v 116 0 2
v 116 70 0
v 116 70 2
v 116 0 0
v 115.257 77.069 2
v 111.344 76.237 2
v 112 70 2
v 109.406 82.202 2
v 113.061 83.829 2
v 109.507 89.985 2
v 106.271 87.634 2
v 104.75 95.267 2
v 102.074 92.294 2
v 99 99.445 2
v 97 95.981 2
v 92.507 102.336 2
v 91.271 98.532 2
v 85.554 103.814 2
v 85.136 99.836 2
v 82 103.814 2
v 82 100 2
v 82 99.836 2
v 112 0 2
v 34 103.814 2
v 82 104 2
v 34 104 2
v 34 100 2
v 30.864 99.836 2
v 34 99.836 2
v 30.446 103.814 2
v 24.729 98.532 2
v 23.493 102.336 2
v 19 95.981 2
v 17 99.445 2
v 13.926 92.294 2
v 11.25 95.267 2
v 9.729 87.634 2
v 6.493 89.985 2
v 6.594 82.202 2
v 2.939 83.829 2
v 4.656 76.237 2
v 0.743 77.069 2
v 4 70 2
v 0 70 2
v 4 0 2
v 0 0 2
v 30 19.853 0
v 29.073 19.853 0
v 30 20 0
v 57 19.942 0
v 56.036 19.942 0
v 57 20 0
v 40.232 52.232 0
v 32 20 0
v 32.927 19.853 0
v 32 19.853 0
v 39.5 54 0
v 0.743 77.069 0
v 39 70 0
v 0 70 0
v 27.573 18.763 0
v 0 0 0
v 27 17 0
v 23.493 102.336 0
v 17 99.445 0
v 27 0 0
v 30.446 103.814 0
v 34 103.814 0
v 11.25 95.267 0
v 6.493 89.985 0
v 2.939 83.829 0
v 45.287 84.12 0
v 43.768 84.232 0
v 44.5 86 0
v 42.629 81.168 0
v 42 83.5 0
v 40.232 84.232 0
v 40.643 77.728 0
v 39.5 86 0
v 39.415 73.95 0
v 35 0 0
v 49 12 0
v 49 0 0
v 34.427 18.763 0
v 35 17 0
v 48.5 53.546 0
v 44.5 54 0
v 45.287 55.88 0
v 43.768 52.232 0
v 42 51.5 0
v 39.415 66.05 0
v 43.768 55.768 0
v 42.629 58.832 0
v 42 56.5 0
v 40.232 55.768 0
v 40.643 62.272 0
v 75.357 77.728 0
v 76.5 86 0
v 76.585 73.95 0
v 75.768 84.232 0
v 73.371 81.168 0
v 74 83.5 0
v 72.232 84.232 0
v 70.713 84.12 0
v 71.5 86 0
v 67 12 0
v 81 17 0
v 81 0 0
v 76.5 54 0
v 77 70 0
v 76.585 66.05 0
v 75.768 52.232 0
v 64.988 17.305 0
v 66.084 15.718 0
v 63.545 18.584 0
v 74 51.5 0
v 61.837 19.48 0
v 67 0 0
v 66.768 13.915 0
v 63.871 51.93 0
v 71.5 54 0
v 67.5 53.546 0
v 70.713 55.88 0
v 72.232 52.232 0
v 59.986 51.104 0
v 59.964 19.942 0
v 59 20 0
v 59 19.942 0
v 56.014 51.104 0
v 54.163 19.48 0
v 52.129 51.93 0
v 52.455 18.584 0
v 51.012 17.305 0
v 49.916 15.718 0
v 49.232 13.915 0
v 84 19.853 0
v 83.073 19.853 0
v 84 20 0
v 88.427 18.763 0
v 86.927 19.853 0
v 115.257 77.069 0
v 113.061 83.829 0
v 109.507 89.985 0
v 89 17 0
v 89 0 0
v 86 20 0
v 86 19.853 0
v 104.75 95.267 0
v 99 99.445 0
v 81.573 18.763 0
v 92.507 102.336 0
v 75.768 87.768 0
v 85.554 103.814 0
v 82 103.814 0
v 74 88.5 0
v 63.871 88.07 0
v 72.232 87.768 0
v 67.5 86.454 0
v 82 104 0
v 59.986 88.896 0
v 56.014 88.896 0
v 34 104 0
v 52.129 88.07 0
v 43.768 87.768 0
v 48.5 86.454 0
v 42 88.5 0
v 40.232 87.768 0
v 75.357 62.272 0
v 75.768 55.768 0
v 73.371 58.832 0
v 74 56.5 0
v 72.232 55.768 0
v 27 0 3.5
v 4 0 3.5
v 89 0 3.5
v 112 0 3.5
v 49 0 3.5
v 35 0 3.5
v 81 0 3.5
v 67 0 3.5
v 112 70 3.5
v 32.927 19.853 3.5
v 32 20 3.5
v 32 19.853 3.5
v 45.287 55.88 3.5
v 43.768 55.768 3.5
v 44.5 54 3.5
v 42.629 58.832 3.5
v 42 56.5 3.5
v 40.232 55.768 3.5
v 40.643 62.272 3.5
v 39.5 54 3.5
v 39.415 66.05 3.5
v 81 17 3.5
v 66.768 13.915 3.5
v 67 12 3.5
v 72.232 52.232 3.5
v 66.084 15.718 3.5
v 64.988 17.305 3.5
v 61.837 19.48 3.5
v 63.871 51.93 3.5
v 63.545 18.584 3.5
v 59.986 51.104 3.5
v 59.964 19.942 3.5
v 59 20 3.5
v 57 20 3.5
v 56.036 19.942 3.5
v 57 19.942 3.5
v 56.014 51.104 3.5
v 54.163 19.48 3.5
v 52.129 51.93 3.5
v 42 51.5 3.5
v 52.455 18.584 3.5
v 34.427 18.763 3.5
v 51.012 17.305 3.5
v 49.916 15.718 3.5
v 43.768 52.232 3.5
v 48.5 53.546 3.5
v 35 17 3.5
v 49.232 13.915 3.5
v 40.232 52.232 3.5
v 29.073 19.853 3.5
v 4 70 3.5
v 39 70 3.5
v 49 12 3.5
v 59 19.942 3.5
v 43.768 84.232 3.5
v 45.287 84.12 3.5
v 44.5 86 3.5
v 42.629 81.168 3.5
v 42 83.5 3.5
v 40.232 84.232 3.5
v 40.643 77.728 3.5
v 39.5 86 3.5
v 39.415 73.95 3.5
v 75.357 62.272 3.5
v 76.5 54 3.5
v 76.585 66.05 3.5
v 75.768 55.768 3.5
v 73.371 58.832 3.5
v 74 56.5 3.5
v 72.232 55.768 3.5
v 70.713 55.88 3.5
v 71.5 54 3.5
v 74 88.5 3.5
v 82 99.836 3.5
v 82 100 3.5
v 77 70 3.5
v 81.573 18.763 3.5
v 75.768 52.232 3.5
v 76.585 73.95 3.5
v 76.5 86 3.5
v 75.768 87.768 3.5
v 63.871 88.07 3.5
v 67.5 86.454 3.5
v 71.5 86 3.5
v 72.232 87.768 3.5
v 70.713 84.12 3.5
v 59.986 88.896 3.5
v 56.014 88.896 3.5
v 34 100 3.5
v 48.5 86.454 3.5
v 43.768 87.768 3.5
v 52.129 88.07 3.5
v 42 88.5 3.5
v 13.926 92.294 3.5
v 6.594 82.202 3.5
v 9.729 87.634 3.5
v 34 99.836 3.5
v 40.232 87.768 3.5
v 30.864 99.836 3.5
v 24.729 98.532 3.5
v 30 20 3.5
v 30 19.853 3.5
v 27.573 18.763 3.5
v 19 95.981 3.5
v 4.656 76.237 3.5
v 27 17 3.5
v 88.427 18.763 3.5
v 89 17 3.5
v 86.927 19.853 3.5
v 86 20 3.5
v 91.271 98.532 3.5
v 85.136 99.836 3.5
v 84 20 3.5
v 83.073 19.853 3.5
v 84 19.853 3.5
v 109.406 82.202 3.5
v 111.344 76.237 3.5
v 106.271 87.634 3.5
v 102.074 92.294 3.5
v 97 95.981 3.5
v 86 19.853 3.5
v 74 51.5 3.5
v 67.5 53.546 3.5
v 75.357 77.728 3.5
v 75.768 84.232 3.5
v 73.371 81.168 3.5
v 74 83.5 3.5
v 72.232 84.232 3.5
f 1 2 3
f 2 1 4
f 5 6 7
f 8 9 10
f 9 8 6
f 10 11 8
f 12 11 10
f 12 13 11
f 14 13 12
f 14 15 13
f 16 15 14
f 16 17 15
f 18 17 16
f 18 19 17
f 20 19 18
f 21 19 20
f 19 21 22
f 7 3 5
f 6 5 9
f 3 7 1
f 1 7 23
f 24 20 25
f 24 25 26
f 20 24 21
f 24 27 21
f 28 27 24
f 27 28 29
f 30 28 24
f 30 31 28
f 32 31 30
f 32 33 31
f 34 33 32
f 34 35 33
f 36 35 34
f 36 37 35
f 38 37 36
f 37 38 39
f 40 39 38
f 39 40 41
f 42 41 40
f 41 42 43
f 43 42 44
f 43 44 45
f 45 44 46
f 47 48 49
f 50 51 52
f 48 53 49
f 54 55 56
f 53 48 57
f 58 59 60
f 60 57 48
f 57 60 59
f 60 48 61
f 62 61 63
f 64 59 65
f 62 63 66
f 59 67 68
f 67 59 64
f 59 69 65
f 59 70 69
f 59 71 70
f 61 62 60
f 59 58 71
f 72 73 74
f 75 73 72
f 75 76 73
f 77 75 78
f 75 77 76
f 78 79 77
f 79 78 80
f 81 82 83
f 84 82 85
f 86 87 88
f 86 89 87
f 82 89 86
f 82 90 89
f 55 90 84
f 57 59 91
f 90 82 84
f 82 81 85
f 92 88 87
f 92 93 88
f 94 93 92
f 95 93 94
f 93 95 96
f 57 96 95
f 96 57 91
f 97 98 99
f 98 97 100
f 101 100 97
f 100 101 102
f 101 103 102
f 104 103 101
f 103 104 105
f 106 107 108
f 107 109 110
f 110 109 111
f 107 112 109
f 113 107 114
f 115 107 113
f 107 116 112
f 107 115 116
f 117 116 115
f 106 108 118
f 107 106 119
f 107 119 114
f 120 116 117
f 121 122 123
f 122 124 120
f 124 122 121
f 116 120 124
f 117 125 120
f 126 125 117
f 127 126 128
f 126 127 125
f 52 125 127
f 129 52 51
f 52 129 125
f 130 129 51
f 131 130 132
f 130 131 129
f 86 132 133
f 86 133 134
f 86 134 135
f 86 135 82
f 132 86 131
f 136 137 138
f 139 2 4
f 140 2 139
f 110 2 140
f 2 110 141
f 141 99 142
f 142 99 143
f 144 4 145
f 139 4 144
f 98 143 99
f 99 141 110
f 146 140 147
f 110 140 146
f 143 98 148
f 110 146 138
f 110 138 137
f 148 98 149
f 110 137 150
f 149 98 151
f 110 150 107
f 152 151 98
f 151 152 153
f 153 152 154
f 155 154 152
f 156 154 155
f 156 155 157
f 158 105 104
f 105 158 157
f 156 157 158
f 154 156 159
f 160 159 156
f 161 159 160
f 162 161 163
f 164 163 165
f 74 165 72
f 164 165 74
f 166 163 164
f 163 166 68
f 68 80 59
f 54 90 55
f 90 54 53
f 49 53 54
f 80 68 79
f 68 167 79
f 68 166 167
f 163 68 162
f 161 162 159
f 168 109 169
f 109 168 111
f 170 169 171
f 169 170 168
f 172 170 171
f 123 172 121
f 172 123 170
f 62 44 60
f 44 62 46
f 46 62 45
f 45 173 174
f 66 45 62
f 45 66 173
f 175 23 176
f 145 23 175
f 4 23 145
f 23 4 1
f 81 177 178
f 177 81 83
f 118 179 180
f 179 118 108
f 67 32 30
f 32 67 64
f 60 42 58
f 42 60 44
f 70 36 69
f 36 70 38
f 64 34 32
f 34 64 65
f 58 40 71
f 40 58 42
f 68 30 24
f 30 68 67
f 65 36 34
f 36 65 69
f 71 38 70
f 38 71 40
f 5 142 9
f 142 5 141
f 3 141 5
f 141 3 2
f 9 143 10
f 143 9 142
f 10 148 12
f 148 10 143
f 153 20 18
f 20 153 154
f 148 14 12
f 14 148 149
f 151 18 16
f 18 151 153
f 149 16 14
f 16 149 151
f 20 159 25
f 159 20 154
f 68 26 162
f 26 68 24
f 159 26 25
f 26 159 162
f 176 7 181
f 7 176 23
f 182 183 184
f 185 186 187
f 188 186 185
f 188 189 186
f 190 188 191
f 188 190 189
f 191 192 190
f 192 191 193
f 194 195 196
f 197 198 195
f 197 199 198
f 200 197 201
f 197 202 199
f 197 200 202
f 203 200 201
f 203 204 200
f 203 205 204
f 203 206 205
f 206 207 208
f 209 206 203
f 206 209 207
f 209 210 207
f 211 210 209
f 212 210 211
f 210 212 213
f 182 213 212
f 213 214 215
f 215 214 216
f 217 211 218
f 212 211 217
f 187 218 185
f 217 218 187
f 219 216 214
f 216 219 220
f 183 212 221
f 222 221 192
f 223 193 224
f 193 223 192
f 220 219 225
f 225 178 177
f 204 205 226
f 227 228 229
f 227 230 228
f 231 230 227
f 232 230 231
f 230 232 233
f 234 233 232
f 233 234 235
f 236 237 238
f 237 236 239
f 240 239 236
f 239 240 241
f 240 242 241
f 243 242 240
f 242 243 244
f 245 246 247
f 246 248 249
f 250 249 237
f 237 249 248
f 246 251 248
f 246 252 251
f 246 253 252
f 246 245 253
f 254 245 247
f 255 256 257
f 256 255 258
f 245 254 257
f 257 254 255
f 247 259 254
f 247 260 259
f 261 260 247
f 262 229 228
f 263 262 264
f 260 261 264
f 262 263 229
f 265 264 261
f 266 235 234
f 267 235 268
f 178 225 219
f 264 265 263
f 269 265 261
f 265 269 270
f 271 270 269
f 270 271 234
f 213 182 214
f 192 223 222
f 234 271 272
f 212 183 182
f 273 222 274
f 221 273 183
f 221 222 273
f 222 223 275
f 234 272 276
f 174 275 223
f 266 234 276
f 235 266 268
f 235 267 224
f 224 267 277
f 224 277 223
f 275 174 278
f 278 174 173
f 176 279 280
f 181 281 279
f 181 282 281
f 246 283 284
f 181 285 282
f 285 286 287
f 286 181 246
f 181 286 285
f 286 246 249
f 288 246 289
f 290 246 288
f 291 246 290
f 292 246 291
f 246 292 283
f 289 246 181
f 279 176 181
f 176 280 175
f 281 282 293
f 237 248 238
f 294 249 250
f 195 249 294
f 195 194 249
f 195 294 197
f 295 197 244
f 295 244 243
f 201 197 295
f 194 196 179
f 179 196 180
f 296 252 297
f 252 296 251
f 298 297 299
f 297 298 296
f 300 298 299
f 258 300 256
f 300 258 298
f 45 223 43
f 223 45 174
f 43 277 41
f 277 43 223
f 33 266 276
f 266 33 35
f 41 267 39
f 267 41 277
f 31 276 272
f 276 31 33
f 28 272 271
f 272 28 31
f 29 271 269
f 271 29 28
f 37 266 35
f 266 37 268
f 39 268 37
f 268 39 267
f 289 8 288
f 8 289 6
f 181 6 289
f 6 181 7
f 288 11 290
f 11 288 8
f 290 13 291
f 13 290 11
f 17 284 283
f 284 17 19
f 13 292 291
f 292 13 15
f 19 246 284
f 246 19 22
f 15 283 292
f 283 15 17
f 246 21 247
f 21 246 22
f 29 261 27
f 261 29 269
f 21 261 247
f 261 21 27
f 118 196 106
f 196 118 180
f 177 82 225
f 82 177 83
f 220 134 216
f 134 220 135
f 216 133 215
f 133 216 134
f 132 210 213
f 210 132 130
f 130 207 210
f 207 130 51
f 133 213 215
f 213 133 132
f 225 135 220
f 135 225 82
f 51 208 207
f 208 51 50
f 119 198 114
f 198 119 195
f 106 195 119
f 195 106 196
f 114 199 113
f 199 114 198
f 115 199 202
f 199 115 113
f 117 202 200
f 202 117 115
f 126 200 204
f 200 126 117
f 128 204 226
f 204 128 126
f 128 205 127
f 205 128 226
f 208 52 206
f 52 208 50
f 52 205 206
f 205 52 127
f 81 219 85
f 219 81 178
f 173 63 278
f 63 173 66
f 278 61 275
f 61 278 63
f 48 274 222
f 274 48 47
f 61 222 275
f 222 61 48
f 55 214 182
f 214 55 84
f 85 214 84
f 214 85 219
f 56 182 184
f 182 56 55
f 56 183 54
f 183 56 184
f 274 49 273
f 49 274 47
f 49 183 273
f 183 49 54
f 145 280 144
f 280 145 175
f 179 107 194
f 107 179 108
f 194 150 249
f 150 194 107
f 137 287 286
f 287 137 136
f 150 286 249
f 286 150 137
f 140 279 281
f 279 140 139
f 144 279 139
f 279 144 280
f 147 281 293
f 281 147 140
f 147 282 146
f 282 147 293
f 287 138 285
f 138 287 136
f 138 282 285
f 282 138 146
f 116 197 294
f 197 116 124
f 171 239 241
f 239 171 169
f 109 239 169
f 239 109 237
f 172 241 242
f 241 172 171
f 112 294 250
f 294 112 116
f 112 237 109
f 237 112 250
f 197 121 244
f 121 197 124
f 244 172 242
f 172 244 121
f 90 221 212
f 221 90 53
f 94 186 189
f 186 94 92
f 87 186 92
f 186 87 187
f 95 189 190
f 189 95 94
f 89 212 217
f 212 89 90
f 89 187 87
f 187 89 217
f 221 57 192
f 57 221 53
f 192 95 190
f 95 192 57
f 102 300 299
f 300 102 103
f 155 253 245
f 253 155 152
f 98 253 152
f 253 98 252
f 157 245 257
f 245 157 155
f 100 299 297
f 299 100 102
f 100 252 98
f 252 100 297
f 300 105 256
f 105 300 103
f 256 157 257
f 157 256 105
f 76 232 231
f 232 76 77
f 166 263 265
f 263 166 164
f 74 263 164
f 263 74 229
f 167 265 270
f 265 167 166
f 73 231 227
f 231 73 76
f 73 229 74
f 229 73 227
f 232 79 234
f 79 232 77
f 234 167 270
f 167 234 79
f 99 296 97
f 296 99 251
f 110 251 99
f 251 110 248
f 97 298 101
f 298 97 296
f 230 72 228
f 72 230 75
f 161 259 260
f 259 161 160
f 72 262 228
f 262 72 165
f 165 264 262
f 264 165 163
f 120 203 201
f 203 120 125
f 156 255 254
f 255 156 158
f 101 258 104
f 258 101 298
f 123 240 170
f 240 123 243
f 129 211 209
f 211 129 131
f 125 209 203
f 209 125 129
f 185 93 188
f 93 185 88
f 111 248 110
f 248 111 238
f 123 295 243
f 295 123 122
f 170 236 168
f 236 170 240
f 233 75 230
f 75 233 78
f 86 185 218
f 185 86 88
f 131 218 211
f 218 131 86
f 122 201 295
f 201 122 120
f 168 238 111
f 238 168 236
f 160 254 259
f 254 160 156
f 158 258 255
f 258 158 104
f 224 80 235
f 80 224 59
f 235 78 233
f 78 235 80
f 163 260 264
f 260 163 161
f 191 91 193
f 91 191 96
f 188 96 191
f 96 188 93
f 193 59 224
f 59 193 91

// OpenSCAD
/*
rotate([-90,0,0])
translate([55,-21,0])

import("/Users/rchapman/Downloads/hoodvent.stl");
*/
x = 108;  // width of opening we are blocking
y = 100;  // height of opening we are blocking
r = 30;   // radius of curves
z1 = 2;   // thickness of overlap
ac = 3;   // thickness of acrylic

z2 = ac/2; // thickness of acrylic
o = 4;     // overlap width

m = 32;    // fan mount hole spacing
f = 38;    // fan bore

hh = 20;   // central cable arch height
hw = 18;   // central cable arch width
hr = 8;    // central cable arch curve radius

shh = 20;  // side cable arch height
shw = 8;   // side cable arch width
shr = 3;   // side cable arch curve radius

delta = 1;

module arch(x,y,z,r)
{
  cube([x,y-r,z]);
  translate([r,y-r,0])
    cylinder(z,r,r);
  translate([x-r,y-r,0])
    cylinder(z,r,r);
  translate([r,0,0])
    cube([x-2*r,y,z]);
}

difference()
{
    union()
    {
      arch(x+2*o,y+o,z1,r+o);
      translate([o,0,z1])
        arch(x,y,z2,r);
    }    
    translate([o+x/2+m/2, y-r-m/2,-delta/2])
      cylinder(z1+z2+delta,r=2.5);
    translate([o+x/2-m/2, y-r-m/2,-delta/2])
      cylinder(z1+z2+delta,r=2.5);
    translate([o+x/2+m/2, y-r+m/2,-delta/2])
      cylinder(z1+z2+delta,r=2.5);
    translate([o+x/2-m/2, y-r+m/2,-delta/2])
      cylinder(z1+z2+delta,r=2.5);
    translate([o+x/2, y-r,-delta/2])
      cylinder(z1+z2+delta,r=f/2);
    translate([o+x/2-hw/2, -delta, -delta/2])
      arch(hw,hh+delta,z1+z2+delta,hr);

    translate([o+x/4-shw/2, -delta, -delta/2])
      arch(shw,shh+delta,z1+z2+delta,shr);
    translate([o+3*x/4-shw/2, -delta, -delta/2])
      arch(shw,shh+delta,z1+z2+delta,shr);

}
